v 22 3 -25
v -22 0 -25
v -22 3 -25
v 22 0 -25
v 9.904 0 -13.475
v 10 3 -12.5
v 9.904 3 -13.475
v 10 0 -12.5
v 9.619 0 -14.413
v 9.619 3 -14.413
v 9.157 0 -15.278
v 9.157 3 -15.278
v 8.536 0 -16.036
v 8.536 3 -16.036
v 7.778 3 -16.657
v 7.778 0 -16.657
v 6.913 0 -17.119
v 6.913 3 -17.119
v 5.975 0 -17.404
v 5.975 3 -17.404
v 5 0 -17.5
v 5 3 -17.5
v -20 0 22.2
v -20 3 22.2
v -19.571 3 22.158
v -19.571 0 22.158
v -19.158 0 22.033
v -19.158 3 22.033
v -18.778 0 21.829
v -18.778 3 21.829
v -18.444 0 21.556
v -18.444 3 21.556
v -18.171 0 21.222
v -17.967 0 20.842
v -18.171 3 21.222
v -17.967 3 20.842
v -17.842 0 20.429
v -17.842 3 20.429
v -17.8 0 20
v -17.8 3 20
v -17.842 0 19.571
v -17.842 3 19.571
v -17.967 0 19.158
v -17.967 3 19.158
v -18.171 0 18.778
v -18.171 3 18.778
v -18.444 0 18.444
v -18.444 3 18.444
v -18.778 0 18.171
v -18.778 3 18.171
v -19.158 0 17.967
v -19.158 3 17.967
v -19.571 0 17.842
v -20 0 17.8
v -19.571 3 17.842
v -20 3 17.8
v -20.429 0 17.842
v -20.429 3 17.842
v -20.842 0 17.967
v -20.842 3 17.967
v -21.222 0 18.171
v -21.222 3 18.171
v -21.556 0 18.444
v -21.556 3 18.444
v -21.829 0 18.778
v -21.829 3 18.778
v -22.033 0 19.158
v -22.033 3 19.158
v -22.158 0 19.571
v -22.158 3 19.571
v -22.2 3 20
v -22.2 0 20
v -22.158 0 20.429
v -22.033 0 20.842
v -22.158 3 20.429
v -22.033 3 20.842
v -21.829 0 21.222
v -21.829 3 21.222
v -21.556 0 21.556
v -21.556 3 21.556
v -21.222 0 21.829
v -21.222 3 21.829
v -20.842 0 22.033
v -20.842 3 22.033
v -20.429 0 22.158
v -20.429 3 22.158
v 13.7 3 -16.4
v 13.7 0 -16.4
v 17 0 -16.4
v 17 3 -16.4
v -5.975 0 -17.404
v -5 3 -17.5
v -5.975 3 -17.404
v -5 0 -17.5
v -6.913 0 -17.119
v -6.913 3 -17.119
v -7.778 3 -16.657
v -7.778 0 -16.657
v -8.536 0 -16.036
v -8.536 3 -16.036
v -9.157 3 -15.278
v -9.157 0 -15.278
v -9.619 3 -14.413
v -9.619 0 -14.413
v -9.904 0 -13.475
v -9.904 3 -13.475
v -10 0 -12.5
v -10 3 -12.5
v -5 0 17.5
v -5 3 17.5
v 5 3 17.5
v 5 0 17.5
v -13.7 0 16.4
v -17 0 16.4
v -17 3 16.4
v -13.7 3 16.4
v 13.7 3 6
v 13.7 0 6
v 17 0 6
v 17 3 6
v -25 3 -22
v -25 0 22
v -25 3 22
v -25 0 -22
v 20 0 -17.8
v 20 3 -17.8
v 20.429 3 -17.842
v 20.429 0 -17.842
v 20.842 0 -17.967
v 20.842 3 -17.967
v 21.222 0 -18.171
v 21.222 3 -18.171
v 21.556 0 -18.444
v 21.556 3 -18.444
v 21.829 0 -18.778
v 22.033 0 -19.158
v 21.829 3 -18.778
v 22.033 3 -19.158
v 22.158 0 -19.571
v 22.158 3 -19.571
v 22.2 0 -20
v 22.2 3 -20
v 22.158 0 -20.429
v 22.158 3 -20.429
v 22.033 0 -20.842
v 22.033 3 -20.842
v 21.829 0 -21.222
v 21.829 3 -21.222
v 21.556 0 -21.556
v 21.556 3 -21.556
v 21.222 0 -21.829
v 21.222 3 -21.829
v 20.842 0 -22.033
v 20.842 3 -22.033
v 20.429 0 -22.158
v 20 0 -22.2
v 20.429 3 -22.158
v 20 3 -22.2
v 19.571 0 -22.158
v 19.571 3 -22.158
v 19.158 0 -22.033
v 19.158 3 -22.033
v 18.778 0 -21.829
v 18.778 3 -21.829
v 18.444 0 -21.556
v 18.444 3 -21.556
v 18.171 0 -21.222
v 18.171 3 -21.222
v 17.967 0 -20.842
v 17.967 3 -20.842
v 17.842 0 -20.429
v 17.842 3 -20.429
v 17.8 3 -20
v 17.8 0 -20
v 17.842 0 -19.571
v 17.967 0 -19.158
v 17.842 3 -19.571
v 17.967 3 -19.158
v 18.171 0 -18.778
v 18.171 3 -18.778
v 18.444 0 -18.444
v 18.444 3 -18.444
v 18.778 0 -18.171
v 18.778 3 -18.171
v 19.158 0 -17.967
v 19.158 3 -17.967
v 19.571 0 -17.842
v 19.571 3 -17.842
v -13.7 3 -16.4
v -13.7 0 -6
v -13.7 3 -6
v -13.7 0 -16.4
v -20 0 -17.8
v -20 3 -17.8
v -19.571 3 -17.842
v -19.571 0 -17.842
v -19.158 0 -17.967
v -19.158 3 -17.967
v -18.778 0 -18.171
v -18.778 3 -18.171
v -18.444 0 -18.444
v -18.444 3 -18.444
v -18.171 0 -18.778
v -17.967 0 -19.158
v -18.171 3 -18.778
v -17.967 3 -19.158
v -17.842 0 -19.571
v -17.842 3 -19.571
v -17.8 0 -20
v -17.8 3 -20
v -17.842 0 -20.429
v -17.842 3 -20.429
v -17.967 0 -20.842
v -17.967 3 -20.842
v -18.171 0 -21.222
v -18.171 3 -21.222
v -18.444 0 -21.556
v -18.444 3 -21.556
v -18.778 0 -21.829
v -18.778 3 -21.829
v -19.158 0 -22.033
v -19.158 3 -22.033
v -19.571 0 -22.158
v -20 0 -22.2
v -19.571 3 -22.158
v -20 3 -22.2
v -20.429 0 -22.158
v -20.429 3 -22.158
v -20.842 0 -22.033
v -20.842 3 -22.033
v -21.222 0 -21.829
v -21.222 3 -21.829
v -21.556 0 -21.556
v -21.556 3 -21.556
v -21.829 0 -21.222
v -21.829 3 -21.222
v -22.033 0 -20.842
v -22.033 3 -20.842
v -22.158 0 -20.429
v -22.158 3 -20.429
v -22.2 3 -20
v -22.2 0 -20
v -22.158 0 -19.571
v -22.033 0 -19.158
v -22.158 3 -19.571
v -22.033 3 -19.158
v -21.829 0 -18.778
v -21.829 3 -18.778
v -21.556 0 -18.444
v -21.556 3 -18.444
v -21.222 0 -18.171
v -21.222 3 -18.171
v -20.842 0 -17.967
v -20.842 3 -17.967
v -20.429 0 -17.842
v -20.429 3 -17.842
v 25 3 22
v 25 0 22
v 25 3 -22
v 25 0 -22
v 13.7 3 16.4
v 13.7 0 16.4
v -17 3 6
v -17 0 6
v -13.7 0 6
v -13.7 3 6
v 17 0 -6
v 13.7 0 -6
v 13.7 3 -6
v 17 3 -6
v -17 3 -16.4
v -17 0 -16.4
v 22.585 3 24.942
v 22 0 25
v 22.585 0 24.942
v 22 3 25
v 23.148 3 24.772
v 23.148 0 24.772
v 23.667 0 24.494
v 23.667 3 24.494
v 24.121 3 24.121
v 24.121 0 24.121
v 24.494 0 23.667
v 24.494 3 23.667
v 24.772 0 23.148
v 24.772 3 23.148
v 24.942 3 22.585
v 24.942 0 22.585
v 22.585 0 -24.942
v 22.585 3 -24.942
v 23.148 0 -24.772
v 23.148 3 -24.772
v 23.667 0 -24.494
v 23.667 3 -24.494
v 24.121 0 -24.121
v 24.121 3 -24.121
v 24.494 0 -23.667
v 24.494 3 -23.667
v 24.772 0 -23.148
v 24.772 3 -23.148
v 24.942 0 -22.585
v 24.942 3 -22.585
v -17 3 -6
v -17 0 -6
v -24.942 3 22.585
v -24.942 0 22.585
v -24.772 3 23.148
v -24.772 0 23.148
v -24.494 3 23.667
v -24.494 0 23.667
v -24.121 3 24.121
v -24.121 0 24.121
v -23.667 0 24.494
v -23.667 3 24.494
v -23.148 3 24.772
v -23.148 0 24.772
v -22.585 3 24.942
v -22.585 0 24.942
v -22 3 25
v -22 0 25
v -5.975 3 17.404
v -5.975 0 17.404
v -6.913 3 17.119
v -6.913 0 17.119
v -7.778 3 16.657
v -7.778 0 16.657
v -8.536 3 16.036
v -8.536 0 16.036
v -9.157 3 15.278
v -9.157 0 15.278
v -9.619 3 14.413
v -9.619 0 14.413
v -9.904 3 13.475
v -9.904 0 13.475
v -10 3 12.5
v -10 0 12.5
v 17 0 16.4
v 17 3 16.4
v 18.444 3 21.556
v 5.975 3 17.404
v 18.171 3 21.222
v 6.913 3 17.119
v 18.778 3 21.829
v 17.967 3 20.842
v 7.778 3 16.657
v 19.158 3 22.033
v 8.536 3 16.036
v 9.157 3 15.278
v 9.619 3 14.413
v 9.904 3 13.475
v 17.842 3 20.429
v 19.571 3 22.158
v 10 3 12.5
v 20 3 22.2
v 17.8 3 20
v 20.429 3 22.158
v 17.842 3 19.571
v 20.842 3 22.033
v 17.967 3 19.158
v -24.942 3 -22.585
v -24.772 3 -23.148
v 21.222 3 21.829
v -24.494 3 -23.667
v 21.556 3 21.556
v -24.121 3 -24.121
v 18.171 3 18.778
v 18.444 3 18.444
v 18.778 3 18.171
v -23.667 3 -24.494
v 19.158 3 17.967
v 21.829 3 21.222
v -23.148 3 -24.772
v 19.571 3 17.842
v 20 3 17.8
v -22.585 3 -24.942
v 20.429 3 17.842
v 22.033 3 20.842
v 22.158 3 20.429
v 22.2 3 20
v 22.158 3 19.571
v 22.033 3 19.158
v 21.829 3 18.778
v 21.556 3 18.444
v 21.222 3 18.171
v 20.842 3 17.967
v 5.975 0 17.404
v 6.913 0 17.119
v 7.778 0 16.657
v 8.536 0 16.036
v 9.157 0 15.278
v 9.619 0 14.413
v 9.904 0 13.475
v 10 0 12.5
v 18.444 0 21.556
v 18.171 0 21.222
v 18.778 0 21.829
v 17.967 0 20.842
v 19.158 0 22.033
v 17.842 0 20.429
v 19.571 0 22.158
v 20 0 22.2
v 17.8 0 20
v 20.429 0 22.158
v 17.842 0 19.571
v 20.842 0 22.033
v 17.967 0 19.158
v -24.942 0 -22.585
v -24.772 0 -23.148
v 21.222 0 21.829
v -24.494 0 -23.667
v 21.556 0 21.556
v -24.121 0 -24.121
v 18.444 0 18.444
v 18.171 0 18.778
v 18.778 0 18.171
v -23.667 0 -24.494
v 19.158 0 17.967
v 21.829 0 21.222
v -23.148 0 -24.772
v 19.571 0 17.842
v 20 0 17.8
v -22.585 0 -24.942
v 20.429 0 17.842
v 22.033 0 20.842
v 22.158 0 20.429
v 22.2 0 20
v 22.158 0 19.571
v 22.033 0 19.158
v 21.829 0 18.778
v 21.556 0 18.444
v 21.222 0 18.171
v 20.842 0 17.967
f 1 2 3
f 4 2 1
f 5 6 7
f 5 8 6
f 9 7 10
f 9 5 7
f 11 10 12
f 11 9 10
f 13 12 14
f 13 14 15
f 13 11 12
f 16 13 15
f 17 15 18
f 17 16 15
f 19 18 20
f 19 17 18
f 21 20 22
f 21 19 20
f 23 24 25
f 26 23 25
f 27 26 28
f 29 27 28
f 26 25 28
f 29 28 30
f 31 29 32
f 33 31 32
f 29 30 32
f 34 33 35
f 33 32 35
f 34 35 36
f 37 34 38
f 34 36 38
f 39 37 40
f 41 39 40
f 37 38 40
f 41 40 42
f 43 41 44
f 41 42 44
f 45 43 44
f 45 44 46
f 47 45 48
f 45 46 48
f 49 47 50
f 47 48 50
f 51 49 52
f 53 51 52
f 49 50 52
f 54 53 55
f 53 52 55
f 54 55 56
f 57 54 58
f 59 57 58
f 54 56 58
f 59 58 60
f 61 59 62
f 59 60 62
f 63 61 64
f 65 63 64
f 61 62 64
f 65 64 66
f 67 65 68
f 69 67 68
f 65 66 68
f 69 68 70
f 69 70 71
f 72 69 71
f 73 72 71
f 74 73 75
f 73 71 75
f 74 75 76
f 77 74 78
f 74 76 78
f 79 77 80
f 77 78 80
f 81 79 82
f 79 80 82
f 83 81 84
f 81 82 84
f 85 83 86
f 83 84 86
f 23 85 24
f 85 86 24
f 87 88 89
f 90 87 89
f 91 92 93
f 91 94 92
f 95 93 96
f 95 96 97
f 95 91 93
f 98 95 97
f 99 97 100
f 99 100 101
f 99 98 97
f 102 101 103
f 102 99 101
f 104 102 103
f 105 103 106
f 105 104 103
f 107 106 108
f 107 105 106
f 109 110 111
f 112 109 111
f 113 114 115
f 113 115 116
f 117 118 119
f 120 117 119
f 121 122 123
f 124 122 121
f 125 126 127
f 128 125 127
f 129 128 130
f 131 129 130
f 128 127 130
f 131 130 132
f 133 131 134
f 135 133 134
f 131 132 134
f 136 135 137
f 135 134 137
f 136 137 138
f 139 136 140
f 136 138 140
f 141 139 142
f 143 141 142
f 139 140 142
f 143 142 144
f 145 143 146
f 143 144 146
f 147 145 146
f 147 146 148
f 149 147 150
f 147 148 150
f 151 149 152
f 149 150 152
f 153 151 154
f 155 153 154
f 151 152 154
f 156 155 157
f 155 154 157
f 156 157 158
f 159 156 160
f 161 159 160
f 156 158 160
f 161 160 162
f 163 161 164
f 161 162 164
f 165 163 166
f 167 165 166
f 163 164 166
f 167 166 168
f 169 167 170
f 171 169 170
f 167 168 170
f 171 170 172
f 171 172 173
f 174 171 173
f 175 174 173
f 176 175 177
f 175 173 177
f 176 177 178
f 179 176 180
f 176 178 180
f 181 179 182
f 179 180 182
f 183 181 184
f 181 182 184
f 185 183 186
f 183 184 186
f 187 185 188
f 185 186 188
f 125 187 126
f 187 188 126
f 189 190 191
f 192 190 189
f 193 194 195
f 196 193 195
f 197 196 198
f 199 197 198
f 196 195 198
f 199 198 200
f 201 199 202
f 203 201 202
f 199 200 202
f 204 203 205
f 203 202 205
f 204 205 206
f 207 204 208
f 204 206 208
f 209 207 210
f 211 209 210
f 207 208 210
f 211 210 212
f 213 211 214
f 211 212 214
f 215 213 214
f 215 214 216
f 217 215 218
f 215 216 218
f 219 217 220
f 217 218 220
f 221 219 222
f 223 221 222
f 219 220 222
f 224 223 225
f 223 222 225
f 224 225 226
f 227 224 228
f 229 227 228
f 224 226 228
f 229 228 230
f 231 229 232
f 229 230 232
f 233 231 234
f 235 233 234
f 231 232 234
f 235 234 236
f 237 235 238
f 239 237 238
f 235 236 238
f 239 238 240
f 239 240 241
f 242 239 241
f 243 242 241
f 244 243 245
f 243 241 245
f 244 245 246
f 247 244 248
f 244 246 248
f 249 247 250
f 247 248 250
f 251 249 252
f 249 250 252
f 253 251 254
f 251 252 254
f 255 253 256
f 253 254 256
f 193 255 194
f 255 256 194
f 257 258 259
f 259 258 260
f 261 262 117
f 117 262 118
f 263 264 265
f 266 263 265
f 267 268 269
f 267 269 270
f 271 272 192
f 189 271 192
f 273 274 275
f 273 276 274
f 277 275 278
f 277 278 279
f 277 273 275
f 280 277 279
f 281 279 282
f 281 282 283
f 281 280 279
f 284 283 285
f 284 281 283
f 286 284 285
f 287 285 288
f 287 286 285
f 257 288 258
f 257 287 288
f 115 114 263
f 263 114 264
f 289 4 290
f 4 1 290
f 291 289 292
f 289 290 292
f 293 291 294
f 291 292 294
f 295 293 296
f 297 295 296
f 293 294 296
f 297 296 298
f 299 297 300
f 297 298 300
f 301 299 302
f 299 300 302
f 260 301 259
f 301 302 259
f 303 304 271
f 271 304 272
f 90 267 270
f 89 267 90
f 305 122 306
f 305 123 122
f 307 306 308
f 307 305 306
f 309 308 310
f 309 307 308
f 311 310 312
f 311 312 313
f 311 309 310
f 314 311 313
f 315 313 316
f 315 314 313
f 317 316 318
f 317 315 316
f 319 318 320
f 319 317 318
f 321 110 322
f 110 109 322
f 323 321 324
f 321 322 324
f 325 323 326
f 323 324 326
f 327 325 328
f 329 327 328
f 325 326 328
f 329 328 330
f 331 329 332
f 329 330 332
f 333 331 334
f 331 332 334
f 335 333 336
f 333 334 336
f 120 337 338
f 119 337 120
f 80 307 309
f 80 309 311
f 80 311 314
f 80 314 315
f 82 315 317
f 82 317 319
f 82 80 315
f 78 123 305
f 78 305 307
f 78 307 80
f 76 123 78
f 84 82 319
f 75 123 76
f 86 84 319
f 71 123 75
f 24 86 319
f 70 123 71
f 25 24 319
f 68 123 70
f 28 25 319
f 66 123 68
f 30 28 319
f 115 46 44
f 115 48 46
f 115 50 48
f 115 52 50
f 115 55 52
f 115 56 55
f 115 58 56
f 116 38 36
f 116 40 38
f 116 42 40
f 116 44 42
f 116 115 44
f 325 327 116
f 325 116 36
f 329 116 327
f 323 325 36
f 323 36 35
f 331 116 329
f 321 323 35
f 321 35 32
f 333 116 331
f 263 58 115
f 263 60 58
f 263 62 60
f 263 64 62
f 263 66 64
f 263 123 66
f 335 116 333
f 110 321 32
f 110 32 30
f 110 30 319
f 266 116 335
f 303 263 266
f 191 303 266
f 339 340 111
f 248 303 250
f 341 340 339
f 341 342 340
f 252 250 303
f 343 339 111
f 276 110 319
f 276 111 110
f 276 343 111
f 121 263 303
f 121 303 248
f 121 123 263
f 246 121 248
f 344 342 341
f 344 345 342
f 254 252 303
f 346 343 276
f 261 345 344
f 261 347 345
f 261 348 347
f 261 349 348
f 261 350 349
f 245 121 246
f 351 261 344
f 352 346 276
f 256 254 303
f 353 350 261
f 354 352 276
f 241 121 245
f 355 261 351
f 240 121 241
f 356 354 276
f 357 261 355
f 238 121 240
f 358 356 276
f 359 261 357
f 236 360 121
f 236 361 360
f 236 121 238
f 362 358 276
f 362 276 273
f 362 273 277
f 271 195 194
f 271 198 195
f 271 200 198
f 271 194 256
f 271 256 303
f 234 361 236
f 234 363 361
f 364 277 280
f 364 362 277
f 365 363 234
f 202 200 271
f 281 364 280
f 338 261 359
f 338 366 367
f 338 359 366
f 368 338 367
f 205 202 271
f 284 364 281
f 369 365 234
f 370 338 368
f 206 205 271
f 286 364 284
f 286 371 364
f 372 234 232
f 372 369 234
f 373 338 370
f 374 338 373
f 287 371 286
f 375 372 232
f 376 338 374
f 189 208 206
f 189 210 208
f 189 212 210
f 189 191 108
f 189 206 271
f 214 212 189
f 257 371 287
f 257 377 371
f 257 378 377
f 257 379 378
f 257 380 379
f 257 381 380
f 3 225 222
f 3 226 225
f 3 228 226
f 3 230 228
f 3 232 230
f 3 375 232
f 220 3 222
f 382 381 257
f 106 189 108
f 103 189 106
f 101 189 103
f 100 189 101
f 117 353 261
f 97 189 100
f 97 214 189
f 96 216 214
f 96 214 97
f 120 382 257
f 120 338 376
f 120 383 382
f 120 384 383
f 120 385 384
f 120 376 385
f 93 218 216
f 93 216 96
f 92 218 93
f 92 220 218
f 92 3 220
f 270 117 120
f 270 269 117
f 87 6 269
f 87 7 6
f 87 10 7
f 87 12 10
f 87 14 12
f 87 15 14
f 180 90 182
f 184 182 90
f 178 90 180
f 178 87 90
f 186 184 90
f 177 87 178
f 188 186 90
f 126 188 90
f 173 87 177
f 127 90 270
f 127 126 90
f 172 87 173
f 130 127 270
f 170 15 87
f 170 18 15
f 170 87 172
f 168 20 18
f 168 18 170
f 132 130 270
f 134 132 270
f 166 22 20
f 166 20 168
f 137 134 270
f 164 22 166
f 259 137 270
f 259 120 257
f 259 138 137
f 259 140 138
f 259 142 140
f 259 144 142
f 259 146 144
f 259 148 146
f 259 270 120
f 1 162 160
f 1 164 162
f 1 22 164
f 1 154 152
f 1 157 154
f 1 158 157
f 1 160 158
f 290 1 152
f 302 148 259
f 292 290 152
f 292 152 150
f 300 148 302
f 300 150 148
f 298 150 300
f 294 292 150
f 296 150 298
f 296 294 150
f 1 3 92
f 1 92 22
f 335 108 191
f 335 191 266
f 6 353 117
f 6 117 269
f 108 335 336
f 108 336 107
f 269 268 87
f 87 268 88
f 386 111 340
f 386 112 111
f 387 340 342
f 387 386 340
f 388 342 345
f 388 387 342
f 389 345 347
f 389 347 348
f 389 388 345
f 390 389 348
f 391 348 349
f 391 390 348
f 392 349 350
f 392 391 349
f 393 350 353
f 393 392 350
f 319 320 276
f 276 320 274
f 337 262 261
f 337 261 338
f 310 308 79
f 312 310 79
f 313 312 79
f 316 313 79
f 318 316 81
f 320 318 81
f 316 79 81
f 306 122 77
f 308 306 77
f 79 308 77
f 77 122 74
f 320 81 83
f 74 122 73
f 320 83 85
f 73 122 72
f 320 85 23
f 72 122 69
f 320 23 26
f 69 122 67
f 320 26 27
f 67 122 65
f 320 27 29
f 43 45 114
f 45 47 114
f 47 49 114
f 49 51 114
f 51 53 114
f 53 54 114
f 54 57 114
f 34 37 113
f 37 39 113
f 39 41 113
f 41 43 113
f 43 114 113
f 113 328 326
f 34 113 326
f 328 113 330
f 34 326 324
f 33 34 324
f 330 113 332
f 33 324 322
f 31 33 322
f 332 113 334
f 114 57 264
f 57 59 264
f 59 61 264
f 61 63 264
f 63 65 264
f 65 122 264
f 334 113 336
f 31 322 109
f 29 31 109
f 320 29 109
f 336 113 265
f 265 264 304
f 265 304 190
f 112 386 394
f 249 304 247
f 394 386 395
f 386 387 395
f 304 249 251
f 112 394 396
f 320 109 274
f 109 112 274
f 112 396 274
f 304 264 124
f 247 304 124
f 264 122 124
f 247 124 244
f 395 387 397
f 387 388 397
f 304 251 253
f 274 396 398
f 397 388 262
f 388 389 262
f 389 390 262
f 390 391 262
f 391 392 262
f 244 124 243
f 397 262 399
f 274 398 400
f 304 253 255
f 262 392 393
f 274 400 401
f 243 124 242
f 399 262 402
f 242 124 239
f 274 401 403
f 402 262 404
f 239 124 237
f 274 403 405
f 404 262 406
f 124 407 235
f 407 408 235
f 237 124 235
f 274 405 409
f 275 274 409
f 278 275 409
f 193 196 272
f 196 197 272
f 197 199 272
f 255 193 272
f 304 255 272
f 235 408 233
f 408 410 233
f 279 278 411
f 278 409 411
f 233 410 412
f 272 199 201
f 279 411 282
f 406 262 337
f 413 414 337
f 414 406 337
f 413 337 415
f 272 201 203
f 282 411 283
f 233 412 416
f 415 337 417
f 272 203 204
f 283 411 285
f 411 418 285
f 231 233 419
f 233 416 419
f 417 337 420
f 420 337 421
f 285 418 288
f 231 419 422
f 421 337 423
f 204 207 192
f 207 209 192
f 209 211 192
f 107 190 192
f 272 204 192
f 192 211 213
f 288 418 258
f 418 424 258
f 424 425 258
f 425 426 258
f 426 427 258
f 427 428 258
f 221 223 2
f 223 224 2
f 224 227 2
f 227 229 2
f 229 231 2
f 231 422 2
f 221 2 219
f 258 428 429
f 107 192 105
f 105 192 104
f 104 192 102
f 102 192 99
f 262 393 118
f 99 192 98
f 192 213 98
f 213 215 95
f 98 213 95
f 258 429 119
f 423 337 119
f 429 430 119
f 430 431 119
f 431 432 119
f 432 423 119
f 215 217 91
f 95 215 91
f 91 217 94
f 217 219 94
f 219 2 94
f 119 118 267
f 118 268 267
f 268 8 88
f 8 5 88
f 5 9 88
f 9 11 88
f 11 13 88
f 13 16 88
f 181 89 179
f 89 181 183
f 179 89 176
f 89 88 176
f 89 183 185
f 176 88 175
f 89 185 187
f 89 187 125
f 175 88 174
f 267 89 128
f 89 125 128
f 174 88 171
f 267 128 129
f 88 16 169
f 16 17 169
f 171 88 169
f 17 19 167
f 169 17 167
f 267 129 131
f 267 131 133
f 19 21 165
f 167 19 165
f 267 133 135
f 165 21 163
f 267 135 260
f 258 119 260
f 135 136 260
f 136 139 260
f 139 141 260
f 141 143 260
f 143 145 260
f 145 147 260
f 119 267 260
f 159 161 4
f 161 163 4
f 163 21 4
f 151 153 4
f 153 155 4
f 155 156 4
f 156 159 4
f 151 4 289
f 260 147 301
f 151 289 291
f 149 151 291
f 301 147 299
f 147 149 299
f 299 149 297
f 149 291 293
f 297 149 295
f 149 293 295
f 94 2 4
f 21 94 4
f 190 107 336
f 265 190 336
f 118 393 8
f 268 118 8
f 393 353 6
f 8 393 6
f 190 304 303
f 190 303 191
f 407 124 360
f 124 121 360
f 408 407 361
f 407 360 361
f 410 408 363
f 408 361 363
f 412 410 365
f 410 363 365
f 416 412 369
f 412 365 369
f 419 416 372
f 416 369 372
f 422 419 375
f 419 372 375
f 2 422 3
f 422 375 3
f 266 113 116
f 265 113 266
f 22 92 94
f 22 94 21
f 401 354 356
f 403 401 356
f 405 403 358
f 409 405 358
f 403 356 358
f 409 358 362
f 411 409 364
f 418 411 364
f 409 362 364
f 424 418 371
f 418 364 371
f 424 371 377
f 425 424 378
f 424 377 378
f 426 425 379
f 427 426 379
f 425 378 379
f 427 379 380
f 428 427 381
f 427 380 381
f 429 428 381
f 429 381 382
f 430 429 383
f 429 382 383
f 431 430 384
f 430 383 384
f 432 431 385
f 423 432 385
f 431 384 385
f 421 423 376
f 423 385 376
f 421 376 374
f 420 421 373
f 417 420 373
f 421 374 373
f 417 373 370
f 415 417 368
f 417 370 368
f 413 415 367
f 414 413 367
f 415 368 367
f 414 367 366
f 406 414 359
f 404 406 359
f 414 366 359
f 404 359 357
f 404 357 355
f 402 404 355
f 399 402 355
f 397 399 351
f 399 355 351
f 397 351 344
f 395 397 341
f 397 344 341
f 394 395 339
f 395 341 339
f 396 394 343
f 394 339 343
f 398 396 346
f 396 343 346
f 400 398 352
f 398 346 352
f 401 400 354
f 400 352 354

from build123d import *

# Parameters (mm, degrees)
SKETCH_1_W          = 50
SKETCH_1_H          = 50
SKETCH_1_W_2        = 3.3
SKETCH_1_H_2        = 10.4
EXTRUDE_1_DEPTH     = 3
SKETCH_2_W          = 20
SKETCH_2_H          = 35
CUT_EXTRUDE_1_DEPTH = 3
FILLET_1_R          = 5
SKETCH_3_R          = 2.2
CUT_EXTRUDE_2_DEPTH = 3
FILLET_2_R          = 3


with BuildPart() as part:
    # 草图1 → 凸台-拉伸1 (new body)
    with BuildSketch(Plane(origin=(0, 0, 0), x_dir=(1, 0, 0), z_dir=(0, 1, 0))):
        Rectangle(SKETCH_1_W, SKETCH_1_H)
        with Locations((15.35, 11.2)):
            Rectangle(SKETCH_1_W_2, SKETCH_1_H_2, mode=Mode.SUBTRACT)
        with Locations((15.35, -11.2)):
            Rectangle(SKETCH_1_W_2, SKETCH_1_H_2, mode=Mode.SUBTRACT)
        with Locations((-15.35, -11.2)):
            Rectangle(SKETCH_1_W_2, SKETCH_1_H_2, mode=Mode.SUBTRACT)
        with Locations((-15.35, 11.2)):
            Rectangle(SKETCH_1_W_2, SKETCH_1_H_2, mode=Mode.SUBTRACT)
    extrude(amount=EXTRUDE_1_DEPTH)

    # 草图2 → 切除-拉伸1 (cut)
    with BuildSketch(Plane(origin=(0, 3, 0), x_dir=(1, 0, 0), z_dir=(0, 1, 0))):
        Rectangle(SKETCH_2_W, SKETCH_2_H)
    extrude(amount=-CUT_EXTRUDE_1_DEPTH, mode=Mode.SUBTRACT)

    # 圆角1
    fillet_1_edges = [part.edges().sort_by_distance(p)[0] for p in [
        (10, 1.5, -17.5),
        (10, 1.5, 17.5),
        (-10, 1.5, 17.5),
        (-10, 1.5, -17.5),
    ]]
    fillet(fillet_1_edges, radius=FILLET_1_R)

    # 草图3 → 切除-拉伸2 (cut)
    with BuildSketch(Plane(origin=(0, 3, 0), x_dir=(1, 0, 0), z_dir=(0, 1, 0))):
        with Locations(Location((-20, 20, 0), (0, 0, 270))):
            Circle(SKETCH_3_R)
        with Locations(Location((20, 20, 0), (0, 0, 270))):
            Circle(SKETCH_3_R)
        with Locations(Location((20, -20, 0), (0, 0, 270))):
            Circle(SKETCH_3_R)
        with Locations(Location((-20, -20, 0), (0, 0, 270))):
            Circle(SKETCH_3_R)
    extrude(amount=-CUT_EXTRUDE_2_DEPTH, mode=Mode.SUBTRACT)

    # 圆角2
    fillet_2_edges = [part.edges().sort_by_distance(p)[0] for p in [
        (25, 1.5, 25),
        (-25, 1.5, 25),
        (-25, 1.5, -25),
        (25, 1.5, -25),
    ]]
    fillet(fillet_2_edges, radius=FILLET_2_R)


solid = part.part
